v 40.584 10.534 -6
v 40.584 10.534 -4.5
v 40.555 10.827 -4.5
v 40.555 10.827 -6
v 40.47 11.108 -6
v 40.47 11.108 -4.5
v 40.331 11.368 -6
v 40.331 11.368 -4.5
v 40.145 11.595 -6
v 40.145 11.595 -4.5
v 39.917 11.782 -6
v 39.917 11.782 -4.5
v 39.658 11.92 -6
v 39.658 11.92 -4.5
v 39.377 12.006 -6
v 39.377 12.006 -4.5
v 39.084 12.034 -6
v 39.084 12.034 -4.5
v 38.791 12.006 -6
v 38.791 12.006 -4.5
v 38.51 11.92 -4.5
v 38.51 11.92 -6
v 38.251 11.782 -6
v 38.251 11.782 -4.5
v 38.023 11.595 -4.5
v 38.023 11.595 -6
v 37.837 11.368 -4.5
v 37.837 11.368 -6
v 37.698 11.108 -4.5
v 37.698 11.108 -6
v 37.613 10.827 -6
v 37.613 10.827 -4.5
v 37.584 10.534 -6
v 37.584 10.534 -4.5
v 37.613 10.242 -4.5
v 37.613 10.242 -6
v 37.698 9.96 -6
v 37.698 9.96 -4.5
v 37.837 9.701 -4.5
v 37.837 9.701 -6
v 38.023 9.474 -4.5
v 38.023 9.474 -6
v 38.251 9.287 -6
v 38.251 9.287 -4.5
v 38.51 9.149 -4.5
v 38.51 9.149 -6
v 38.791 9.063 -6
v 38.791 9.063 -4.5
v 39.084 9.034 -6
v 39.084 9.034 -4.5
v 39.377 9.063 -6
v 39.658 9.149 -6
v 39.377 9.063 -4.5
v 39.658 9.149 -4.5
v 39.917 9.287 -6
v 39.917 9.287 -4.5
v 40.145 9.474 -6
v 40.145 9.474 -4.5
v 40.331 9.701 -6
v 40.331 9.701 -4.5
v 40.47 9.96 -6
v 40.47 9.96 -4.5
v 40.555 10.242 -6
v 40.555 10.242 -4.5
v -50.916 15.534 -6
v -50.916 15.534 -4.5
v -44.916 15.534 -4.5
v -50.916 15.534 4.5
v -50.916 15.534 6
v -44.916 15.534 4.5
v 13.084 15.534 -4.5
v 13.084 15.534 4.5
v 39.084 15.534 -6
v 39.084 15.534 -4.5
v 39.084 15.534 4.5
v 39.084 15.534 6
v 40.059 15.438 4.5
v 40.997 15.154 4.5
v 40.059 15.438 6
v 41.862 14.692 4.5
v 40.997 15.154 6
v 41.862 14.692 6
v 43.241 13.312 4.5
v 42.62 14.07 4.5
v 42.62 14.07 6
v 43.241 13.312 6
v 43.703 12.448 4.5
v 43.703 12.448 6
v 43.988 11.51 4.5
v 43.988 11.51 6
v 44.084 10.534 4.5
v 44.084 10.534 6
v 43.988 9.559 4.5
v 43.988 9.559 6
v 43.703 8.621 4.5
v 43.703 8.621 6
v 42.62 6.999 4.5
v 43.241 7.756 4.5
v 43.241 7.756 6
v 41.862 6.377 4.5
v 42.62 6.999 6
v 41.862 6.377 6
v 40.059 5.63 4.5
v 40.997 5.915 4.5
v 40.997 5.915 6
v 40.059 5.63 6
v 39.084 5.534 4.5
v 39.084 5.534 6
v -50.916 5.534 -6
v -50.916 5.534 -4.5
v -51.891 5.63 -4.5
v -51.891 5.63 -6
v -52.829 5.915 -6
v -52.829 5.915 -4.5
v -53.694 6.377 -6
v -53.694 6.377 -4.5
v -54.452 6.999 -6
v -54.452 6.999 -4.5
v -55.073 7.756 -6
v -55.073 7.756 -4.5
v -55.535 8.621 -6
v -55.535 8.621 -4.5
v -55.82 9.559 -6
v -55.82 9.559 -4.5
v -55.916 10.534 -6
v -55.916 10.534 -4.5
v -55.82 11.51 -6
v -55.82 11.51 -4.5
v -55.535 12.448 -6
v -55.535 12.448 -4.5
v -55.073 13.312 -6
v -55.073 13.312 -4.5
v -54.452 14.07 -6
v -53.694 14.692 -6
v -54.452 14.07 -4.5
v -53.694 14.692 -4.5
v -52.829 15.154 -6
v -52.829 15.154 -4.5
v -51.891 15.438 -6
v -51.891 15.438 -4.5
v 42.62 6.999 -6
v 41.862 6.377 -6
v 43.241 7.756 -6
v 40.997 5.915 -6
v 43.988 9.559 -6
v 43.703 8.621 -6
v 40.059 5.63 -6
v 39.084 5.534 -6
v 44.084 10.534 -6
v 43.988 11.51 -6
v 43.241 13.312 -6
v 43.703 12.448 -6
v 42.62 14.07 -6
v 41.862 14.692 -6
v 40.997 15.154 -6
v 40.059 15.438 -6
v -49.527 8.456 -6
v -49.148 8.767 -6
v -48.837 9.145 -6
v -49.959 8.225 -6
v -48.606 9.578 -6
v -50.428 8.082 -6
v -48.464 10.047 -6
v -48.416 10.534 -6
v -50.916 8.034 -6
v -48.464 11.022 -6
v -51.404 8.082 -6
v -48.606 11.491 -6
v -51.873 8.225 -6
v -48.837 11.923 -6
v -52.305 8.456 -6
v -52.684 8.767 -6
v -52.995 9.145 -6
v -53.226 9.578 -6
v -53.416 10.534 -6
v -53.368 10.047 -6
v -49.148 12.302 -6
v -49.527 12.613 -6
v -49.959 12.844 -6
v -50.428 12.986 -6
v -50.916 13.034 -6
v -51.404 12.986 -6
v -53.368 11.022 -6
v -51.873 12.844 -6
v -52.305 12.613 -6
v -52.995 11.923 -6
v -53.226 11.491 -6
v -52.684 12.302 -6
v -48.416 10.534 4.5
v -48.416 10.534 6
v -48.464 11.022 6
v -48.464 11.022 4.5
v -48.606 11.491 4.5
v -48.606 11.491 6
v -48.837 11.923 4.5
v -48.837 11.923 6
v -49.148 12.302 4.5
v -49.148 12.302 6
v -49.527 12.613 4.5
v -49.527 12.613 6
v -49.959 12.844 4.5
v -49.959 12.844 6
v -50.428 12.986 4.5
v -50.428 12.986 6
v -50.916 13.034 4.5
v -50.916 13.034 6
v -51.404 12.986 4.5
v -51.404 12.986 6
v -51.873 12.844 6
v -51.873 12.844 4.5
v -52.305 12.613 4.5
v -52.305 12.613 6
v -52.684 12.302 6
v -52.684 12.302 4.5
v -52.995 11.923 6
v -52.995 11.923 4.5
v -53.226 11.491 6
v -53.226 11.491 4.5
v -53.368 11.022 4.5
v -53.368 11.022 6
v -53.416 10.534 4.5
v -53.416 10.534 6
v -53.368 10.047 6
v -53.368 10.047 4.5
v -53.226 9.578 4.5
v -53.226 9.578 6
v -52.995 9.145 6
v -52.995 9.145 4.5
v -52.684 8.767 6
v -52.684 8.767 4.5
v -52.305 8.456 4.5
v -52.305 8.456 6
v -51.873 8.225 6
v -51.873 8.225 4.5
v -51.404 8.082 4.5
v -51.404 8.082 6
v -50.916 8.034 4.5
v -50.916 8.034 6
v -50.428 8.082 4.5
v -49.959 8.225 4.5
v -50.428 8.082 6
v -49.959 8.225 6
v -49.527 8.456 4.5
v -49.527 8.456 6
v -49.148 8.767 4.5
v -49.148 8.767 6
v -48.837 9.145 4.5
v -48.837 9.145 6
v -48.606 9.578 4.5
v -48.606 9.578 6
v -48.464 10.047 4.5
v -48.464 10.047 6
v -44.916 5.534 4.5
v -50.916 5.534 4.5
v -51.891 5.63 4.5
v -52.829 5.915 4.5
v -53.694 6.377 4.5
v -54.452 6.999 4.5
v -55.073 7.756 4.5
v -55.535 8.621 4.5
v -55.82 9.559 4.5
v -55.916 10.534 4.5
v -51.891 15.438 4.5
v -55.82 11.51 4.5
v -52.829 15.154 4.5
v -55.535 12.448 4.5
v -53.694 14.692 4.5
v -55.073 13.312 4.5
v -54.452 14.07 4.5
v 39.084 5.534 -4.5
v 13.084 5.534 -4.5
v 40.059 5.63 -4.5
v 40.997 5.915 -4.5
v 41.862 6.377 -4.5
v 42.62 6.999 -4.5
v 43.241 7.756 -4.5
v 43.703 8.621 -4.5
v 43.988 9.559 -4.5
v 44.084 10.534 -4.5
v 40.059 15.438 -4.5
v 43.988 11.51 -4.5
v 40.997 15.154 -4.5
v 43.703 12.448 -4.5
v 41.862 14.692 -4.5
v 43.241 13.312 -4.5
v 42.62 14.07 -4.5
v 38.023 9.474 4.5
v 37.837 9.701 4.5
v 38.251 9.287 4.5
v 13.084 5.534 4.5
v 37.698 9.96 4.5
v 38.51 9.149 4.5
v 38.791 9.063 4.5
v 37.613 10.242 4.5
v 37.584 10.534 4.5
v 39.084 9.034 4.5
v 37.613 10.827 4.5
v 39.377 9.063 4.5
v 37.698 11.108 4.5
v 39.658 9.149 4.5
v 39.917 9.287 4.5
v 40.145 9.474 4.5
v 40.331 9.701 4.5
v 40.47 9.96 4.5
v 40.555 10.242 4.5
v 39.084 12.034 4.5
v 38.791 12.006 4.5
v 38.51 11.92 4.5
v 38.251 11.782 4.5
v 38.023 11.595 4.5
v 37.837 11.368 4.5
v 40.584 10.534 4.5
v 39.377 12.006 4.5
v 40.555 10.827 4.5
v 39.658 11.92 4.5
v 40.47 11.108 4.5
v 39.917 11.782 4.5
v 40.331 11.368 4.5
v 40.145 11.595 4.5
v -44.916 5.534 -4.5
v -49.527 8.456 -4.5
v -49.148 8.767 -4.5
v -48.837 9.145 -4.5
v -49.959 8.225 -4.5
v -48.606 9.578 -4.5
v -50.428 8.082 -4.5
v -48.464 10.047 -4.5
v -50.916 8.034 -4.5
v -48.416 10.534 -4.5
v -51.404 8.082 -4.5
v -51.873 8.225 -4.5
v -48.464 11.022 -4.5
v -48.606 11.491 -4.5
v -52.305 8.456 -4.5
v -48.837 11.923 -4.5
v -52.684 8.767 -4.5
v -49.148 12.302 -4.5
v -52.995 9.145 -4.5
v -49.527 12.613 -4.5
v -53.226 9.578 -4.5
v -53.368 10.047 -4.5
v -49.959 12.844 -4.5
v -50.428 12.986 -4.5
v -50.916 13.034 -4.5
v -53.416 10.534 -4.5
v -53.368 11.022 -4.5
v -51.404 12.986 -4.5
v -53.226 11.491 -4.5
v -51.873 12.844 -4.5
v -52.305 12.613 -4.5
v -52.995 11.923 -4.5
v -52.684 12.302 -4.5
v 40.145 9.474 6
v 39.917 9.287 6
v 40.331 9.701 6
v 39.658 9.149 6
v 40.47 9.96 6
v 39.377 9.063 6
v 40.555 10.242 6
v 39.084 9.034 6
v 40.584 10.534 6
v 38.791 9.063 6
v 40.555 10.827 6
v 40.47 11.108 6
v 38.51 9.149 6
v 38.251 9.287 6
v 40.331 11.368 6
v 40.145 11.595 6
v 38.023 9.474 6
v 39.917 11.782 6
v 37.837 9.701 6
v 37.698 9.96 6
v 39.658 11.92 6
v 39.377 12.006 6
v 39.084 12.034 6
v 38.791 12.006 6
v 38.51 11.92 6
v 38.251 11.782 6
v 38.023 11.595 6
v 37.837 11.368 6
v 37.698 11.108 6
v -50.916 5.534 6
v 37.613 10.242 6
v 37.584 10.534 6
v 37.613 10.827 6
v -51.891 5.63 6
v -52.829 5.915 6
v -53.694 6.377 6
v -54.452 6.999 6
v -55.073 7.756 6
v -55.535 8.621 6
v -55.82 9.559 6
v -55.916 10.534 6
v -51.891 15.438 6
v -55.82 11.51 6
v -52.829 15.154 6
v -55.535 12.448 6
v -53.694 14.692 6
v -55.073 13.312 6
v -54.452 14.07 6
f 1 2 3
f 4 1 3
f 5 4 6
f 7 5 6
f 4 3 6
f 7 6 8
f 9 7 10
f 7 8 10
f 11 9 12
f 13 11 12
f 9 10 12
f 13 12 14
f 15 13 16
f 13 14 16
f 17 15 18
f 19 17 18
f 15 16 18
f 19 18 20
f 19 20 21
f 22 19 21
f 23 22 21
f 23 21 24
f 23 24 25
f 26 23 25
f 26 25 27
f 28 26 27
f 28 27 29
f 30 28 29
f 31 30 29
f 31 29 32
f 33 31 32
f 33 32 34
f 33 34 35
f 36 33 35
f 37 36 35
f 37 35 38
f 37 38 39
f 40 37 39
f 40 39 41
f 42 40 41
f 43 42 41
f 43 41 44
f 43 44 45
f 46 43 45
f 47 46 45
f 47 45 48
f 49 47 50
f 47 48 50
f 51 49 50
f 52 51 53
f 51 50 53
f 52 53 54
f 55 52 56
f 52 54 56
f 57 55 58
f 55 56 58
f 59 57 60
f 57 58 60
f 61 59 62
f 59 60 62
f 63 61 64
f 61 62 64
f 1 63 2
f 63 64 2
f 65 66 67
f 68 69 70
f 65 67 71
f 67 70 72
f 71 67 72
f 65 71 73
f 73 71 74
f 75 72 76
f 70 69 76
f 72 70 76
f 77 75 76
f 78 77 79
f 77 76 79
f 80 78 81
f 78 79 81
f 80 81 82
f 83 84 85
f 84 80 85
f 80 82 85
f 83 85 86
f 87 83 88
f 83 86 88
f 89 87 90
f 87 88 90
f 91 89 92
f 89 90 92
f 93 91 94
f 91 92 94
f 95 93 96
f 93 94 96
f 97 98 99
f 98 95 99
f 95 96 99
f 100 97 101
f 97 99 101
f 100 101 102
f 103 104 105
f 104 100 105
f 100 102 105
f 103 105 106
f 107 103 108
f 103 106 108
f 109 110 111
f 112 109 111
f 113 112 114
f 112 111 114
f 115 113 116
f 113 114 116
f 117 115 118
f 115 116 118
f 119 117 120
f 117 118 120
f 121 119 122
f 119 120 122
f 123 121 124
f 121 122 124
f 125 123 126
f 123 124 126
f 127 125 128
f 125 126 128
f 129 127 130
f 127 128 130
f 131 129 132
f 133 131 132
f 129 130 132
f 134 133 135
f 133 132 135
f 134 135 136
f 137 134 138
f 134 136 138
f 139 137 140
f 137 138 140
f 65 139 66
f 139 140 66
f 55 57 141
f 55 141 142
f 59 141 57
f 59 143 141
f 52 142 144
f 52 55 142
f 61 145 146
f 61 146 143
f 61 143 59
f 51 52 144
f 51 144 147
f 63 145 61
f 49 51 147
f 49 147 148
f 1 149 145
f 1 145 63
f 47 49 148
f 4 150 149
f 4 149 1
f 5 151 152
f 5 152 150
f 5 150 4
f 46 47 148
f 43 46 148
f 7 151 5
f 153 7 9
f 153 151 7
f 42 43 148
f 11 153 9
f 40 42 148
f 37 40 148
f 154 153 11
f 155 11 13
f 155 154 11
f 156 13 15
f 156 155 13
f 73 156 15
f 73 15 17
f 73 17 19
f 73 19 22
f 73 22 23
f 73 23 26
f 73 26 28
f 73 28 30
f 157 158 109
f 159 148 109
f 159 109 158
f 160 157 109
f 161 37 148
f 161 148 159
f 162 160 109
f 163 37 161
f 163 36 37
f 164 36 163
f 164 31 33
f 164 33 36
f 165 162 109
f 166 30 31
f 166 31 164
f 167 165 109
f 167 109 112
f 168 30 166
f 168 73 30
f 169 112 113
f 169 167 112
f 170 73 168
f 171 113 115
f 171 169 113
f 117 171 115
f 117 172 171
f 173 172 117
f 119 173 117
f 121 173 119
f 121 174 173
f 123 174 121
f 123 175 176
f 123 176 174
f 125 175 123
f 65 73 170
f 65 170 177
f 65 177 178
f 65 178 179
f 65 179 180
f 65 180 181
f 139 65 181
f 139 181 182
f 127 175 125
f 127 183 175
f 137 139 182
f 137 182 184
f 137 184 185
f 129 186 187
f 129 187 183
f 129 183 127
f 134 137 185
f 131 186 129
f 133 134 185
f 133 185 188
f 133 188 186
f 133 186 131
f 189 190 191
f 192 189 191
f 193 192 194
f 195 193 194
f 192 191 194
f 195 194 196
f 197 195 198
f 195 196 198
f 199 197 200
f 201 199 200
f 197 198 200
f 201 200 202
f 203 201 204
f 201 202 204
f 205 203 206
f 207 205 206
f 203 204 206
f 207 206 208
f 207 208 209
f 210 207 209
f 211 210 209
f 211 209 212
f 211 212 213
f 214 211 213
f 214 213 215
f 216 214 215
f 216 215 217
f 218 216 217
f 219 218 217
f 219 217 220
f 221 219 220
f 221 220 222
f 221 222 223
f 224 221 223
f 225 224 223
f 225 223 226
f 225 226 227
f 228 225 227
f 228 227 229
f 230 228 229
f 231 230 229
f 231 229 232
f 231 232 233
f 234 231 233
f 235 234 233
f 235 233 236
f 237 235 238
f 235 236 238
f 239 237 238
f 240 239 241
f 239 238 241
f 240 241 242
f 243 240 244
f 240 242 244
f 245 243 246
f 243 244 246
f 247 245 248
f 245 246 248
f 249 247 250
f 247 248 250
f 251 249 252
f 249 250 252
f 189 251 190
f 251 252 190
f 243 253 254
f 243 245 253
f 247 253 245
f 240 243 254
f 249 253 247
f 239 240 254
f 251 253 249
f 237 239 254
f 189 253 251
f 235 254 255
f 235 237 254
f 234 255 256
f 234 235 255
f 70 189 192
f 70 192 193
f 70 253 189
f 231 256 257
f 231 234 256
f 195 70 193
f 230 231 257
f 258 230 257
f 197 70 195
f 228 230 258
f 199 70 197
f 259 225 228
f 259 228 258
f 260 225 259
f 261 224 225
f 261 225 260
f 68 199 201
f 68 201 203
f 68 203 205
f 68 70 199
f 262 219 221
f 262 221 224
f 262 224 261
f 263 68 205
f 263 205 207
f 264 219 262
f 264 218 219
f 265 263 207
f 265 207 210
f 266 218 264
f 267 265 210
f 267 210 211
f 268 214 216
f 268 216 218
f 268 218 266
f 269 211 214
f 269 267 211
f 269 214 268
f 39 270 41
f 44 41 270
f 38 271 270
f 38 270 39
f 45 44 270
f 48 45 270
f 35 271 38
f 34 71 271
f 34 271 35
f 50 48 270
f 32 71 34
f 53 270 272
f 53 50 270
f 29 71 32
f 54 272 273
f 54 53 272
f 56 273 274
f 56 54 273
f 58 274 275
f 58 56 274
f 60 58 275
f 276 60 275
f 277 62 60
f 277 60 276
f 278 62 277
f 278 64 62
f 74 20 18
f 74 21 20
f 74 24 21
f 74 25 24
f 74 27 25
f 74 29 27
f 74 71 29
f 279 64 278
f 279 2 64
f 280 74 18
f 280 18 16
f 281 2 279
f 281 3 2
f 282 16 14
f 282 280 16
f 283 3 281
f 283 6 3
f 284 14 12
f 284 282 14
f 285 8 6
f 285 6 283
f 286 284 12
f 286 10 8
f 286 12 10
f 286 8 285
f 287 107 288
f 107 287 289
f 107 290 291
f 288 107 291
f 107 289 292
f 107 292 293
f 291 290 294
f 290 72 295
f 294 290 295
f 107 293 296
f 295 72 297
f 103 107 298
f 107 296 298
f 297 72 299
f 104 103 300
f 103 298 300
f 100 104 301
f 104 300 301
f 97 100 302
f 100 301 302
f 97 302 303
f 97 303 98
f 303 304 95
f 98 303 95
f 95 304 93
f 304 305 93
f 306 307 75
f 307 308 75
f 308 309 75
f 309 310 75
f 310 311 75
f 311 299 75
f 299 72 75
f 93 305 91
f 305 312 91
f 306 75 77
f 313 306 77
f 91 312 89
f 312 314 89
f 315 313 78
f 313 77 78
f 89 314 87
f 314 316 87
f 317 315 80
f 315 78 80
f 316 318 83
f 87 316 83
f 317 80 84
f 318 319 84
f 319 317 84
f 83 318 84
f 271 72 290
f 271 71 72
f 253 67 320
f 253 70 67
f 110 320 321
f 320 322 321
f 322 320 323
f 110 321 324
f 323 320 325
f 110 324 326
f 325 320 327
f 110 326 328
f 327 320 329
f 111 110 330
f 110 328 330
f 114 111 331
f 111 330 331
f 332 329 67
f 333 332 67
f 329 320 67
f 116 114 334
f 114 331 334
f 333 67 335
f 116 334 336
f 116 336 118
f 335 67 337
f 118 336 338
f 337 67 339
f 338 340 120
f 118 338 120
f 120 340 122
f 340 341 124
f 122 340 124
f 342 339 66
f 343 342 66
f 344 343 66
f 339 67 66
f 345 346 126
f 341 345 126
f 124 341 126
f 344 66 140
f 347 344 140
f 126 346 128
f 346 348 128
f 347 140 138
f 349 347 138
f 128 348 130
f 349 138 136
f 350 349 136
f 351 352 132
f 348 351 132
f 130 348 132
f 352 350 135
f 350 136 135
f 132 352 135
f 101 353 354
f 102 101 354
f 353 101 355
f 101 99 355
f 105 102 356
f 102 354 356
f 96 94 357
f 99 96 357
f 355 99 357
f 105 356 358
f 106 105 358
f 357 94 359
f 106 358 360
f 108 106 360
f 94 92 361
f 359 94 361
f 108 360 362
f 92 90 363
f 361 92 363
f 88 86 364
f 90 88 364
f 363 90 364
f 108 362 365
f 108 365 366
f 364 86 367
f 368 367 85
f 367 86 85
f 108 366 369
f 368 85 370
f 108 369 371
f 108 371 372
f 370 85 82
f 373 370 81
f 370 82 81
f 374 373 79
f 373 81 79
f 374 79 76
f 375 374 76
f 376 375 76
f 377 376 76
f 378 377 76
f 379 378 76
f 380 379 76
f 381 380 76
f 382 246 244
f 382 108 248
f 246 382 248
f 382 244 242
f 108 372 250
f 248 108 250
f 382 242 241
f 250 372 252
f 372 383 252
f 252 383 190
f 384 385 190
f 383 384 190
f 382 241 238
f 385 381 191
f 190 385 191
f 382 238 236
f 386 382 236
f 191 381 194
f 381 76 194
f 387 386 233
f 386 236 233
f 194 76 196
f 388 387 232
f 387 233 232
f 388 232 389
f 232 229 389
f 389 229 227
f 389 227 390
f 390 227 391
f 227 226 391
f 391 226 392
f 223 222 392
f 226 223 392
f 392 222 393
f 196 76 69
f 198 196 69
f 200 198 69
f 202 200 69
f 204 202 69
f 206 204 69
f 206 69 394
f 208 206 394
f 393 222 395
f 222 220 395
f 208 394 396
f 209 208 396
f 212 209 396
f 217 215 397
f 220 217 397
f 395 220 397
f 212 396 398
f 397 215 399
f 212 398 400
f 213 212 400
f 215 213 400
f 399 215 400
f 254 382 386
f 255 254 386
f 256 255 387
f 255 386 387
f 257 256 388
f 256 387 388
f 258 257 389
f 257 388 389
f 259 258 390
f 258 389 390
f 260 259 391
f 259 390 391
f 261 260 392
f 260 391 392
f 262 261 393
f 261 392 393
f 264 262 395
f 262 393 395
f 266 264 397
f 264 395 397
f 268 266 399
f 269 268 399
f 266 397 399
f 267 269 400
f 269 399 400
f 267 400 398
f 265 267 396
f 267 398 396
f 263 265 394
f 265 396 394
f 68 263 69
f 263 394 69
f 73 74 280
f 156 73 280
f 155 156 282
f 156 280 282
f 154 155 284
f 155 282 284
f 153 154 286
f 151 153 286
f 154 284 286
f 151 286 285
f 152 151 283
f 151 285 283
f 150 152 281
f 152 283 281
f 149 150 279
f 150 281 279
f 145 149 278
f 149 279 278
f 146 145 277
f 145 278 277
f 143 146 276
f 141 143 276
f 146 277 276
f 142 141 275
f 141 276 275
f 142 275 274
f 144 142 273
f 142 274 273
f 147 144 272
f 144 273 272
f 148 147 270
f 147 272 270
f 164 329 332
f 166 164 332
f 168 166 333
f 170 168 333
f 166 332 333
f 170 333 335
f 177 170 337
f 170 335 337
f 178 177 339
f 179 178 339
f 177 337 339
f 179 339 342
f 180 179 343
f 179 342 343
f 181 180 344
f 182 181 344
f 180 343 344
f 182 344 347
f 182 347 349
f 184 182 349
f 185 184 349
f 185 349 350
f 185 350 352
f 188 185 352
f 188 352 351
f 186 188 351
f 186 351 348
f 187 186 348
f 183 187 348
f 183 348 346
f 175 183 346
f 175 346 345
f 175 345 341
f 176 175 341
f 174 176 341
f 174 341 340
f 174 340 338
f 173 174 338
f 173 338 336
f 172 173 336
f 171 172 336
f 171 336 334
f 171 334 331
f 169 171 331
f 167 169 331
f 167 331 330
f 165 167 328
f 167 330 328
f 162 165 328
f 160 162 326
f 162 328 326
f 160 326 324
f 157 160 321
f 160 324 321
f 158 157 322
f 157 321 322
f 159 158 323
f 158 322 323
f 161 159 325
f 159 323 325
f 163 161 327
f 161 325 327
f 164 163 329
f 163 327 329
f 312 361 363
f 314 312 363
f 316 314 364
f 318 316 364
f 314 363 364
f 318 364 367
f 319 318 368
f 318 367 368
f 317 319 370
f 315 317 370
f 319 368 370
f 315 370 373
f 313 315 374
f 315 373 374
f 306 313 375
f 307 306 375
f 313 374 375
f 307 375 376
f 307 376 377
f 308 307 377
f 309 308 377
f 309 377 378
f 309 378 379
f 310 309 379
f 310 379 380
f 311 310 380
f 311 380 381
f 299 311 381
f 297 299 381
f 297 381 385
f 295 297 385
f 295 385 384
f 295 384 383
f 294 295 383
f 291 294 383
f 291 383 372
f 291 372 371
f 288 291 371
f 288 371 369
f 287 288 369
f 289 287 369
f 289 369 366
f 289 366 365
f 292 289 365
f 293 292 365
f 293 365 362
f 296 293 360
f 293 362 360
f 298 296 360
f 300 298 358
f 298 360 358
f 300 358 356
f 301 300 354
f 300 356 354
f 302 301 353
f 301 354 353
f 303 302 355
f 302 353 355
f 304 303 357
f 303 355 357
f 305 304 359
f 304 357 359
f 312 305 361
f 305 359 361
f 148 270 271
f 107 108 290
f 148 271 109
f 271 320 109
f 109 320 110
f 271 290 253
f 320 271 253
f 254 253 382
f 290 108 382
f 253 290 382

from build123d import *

# Parameters (mm, degrees)
EXTRUDE_1_DEPTH     = 6
SKETCH_2_R          = 2.5
SKETCH_2_R_2        = 1.5
CUT_EXTRUDE_1_DEPTH = 12
CUT_EXTRUDE_2_DEPTH = 4.5


with BuildPart() as part:
    # 草图1 → 凸台-拉伸1 (new, symmetric)
    with BuildSketch(Plane.XY):
        with BuildLine():
            Line((-50.916030534, 15.534351145), (39.083969466, 15.534351145))
            ThreePointArc((39.083969466, 15.534351145), (44.083969466, 10.534351145), (39.083969466, 5.534351145))
            Line((39.083969466, 5.534351145), (-50.916030534, 5.534351145))
            ThreePointArc((-50.916030534, 5.534351145), (-55.916030534, 10.534351145), (-50.916030534, 15.534351145))
        make_face()
    extrude(amount=EXTRUDE_1_DEPTH, both=True)

    # 草图2 → 切除-拉伸1 (cut)
    with BuildSketch(Plane.XY.offset(6)):
        with Locations((-50.916030534, 10.534351145)):
            Circle(SKETCH_2_R)
        with Locations((39.083969466, 10.534351145)):
            Circle(SKETCH_2_R_2)
    extrude(amount=-CUT_EXTRUDE_1_DEPTH, mode=Mode.SUBTRACT)

    # 草图3 → 切除-拉伸2 (cut, symmetric)
    with BuildSketch(Plane.XY):
        with BuildLine():
            Line((39.083969466, 15.534351145), (13.083969466, 15.534351145))
            Line((13.083969466, 15.534351145), (13.083969466, 5.534351145))
            Line((13.083969466, 5.534351145), (39.083969466, 5.534351145))
            ThreePointArc((39.083969466, 5.534351145), (44.083969466, 10.534351145), (39.083969466, 15.534351145))
        make_face()
        with BuildLine():
            Line((-50.916030534, 15.534351145), (-44.916030534, 15.534351145))
            Line((-44.916030534, 15.534351145), (-44.916030534, 5.534351145))
            Line((-44.916030534, 5.534351145), (-50.916030534, 5.534351145))
            ThreePointArc((-50.916030534, 5.534351145), (-55.916030534, 10.534351145), (-50.916030534, 15.534351145))
        make_face()
    extrude(amount=CUT_EXTRUDE_2_DEPTH, both=True, mode=Mode.SUBTRACT)


solid = part.part
